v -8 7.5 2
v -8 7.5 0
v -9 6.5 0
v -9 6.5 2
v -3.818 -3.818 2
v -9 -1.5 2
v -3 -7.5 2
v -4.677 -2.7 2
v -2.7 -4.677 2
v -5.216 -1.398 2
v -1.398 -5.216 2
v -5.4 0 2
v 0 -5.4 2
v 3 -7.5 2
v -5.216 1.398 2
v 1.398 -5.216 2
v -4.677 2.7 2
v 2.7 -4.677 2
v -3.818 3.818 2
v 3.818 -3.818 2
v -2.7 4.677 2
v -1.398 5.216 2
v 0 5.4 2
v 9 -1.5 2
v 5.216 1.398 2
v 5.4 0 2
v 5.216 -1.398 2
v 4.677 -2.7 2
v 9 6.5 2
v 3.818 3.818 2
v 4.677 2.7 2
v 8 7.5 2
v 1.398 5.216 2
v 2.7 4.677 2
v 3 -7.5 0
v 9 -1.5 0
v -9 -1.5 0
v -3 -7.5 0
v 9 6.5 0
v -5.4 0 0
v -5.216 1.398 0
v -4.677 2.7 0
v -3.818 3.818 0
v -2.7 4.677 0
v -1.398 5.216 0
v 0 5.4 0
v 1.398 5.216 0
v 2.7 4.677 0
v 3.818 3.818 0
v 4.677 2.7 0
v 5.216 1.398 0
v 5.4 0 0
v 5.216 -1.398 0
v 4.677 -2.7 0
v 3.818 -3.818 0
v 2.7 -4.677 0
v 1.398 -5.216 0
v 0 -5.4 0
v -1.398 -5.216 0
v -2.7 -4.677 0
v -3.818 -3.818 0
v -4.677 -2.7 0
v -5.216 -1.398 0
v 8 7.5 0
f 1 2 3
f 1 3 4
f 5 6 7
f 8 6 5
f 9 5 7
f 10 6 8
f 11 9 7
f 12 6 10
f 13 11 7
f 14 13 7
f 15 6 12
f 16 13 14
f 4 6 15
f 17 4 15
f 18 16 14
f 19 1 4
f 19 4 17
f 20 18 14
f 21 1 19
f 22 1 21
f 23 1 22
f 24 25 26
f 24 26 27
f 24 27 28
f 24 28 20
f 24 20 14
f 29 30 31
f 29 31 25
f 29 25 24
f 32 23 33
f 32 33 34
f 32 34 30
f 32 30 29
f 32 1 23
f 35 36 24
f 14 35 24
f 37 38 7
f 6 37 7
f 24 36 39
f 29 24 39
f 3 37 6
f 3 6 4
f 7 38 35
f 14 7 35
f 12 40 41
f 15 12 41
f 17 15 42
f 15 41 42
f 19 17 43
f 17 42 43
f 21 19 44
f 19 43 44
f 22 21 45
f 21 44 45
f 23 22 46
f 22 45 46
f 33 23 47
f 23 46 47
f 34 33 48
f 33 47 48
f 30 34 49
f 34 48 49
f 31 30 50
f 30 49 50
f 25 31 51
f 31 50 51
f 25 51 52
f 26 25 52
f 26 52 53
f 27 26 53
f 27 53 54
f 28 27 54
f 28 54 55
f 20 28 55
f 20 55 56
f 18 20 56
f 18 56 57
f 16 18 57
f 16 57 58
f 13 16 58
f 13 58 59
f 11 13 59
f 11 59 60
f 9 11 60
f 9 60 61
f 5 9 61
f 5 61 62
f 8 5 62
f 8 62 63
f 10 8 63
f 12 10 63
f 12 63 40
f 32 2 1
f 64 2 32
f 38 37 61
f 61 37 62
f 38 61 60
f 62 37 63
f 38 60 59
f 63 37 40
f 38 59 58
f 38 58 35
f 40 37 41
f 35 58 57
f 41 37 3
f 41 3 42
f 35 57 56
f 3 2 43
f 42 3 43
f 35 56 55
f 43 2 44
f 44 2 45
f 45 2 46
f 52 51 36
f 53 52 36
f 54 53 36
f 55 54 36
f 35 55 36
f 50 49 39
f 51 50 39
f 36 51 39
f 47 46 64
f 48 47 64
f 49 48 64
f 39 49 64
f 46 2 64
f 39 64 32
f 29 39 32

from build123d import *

# Parameters (mm, degrees)
SKETCH1_W                   = 18
SKETCH1_H                   = 15
BOSS_EXTRUDE1_DEPTH         = 2
CHAMFER1_SIZE               = 1
M12X1_25_TAPPED_HOLE1_D     = 10.8
M12X1_25_TAPPED_HOLE1_DEPTH = 8.75
M12X1_25_TAPPED_HOLE1_TIP   = 3.244647343
CHAMFER2_SIZE               = 6


with BuildPart() as part:
    # Sketch1 → Boss-Extrude1 (new body)
    with BuildSketch(Plane.XY):
        Rectangle(SKETCH1_W, SKETCH1_H)
    extrude(amount=BOSS_EXTRUDE1_DEPTH)

    # Chamfer1
    chamfer1_edges = [part.edges().sort_by_distance(p)[0] for p in [
        (-9, 7.5, 1),
        (9, 7.5, 1),
    ]]
    chamfer(chamfer1_edges, length=CHAMFER1_SIZE)

    # M12x1.25 Tapped Hole1
    with Locations(Plane.XY.offset(2)):
        with Locations((0, 0)):
            Hole(M12X1_25_TAPPED_HOLE1_D / 2, depth=M12X1_25_TAPPED_HOLE1_DEPTH)
            with Locations((0, 0, -(M12X1_25_TAPPED_HOLE1_DEPTH + M12X1_25_TAPPED_HOLE1_TIP / 2))):  # 118° drill point
                Cone(0, M12X1_25_TAPPED_HOLE1_D / 2, M12X1_25_TAPPED_HOLE1_TIP, mode=Mode.SUBTRACT)

    # Chamfer2
    chamfer2_edges = [part.edges().sort_by_distance(p)[0] for p in [
        (9, -7.5, 1),
        (-9, -7.5, 1),
    ]]
    chamfer(chamfer2_edges, length=CHAMFER2_SIZE)


solid = part.part
